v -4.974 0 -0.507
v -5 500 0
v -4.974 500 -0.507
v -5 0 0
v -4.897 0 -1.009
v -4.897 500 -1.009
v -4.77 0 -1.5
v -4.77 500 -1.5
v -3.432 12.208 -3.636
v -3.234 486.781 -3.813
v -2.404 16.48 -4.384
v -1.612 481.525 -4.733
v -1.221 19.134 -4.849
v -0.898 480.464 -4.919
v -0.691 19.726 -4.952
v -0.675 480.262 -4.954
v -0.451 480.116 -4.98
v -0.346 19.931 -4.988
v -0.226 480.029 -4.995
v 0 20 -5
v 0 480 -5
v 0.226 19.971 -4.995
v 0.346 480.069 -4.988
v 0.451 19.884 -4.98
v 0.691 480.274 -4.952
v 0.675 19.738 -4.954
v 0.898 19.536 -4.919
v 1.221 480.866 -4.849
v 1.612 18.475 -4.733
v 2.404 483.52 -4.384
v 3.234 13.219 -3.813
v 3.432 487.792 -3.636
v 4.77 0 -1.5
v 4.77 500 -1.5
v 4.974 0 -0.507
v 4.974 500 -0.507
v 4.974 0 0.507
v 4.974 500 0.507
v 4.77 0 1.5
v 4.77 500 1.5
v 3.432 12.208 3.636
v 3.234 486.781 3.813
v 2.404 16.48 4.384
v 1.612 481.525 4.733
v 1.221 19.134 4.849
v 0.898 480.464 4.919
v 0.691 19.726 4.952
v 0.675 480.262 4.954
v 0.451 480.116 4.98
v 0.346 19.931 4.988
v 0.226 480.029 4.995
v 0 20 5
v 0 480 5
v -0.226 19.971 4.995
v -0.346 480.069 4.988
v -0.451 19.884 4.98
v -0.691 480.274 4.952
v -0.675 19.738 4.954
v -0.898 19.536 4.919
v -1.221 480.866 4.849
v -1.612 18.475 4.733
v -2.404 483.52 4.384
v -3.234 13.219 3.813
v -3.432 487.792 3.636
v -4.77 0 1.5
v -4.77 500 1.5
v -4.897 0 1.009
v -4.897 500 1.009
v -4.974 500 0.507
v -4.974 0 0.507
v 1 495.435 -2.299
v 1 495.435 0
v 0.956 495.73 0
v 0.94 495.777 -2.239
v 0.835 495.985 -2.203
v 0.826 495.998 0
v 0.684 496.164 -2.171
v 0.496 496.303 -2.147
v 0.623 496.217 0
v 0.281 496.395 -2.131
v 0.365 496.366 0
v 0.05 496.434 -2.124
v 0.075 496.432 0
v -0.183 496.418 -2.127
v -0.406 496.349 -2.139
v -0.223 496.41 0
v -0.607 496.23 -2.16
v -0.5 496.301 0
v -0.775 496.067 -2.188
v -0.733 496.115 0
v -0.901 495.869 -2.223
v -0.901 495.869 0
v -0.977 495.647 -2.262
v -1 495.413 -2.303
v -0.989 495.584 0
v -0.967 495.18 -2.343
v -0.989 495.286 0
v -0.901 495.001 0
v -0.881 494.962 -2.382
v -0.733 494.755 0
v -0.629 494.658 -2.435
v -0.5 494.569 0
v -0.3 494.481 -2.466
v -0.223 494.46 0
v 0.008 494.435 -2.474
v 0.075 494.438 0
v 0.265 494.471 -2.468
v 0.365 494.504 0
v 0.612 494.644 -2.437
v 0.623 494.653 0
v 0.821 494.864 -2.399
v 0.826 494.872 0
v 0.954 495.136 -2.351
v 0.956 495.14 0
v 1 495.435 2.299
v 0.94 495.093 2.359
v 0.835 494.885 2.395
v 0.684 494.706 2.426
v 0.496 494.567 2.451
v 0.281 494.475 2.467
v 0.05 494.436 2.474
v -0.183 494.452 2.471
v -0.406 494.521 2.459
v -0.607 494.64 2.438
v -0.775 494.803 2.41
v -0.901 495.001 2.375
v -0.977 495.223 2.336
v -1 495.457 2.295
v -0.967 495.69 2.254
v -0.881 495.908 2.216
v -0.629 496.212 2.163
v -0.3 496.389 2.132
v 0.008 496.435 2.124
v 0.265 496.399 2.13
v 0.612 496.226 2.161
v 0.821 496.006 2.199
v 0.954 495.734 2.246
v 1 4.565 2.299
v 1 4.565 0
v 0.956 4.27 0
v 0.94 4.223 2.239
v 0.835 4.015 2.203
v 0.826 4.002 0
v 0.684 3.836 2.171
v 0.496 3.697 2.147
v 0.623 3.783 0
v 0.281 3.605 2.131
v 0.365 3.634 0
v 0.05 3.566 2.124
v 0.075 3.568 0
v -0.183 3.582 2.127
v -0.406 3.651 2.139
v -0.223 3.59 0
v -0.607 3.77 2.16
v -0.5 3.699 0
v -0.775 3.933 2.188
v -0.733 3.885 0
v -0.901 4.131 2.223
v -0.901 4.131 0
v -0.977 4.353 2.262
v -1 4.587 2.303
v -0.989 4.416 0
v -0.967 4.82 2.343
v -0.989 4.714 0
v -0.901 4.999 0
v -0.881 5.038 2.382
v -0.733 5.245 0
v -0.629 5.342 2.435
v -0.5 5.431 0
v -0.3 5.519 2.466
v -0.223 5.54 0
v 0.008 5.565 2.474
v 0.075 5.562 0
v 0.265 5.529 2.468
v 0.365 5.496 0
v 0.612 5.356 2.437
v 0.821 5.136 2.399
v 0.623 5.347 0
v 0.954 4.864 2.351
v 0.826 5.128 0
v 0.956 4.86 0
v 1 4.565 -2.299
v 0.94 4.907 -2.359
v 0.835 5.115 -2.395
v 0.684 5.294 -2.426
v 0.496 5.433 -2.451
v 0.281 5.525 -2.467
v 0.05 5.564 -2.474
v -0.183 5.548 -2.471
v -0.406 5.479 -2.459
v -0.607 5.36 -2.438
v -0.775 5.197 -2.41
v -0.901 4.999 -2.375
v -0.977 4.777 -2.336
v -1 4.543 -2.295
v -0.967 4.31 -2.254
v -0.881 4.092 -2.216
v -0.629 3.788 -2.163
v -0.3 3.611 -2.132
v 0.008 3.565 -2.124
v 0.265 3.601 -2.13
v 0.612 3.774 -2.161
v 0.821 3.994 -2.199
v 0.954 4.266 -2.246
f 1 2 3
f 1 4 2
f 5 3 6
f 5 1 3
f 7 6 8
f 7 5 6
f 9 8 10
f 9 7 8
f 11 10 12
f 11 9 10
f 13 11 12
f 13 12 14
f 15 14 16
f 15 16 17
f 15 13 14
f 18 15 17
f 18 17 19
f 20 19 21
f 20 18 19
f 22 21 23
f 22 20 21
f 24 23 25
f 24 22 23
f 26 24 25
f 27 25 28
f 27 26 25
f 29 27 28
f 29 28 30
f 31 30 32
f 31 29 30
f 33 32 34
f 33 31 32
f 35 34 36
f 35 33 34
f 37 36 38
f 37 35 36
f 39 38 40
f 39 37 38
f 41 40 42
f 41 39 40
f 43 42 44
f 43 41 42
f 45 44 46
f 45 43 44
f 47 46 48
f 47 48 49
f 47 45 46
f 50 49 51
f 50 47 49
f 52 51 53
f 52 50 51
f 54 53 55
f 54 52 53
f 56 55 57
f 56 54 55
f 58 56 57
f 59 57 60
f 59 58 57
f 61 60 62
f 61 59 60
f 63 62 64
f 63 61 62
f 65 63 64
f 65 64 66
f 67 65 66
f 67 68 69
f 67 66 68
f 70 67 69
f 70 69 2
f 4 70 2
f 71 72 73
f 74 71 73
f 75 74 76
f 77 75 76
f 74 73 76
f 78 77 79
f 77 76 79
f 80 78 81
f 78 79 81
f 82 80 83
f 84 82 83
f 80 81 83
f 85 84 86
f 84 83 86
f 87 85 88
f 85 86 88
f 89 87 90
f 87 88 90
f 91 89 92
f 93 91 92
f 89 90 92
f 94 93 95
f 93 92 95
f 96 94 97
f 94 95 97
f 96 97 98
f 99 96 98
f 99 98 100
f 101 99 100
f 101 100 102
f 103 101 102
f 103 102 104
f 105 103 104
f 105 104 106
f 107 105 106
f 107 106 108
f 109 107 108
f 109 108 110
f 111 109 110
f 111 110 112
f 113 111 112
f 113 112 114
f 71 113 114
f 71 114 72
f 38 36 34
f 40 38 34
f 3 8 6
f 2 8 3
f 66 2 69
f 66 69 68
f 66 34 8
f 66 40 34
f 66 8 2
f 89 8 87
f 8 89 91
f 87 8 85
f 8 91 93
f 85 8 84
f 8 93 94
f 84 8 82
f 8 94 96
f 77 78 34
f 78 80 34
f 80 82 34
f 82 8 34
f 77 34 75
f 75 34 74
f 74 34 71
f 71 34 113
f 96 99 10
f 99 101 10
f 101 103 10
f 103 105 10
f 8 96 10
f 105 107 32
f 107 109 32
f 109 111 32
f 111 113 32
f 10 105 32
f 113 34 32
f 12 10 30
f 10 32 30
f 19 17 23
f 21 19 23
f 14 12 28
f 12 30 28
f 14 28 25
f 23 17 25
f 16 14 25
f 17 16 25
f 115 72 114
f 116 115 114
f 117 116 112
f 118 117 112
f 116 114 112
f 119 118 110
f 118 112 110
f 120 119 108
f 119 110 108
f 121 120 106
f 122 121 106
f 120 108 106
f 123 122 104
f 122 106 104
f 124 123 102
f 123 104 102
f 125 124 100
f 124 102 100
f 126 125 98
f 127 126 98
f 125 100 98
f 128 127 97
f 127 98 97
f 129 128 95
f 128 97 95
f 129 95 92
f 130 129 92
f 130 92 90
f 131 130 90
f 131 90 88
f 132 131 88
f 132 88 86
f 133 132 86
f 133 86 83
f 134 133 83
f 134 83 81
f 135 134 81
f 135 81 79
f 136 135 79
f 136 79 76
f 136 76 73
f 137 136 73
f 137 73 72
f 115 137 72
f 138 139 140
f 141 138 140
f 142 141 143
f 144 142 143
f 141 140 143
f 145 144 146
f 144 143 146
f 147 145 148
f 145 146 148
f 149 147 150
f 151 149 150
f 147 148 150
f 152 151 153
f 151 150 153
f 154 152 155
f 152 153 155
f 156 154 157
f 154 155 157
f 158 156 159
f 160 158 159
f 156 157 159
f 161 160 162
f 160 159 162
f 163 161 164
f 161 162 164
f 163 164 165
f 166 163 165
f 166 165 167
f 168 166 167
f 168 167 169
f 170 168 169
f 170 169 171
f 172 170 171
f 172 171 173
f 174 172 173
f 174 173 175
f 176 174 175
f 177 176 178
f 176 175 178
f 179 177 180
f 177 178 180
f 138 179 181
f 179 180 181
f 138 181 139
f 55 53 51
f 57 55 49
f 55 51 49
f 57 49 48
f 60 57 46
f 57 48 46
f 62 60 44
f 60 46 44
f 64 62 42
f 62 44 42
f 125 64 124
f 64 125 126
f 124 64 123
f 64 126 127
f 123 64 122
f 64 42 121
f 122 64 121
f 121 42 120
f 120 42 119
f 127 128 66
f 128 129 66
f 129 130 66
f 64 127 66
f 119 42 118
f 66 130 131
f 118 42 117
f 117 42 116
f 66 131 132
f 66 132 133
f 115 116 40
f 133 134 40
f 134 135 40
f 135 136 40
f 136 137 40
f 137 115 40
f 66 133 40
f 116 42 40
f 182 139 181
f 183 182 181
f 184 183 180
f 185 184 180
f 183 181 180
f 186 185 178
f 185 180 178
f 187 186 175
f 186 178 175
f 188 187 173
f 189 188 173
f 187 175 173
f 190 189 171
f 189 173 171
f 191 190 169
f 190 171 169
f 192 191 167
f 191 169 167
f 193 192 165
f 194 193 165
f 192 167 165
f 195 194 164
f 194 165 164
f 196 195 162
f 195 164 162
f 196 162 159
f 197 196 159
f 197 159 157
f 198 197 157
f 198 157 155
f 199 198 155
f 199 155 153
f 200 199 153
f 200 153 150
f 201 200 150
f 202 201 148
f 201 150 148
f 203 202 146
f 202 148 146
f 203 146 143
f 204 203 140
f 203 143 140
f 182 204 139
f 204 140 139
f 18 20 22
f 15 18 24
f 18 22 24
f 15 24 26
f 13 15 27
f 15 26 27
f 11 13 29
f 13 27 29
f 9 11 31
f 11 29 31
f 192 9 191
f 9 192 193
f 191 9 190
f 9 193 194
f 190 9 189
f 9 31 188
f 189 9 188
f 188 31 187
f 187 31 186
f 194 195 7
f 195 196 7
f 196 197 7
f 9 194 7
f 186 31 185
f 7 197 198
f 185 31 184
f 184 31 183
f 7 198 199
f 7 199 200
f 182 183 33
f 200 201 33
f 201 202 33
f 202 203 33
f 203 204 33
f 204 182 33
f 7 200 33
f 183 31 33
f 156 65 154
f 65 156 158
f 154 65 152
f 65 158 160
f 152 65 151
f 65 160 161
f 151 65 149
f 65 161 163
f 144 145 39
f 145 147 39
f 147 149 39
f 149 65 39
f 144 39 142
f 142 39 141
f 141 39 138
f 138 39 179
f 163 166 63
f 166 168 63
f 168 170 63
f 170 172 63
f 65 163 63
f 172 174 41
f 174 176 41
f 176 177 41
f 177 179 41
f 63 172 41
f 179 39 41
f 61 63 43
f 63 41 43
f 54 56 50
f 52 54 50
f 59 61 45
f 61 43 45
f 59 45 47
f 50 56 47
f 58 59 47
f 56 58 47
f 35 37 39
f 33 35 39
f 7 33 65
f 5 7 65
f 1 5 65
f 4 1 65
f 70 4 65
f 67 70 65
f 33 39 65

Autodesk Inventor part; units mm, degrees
ref_plane "XZ Plane" through (0, 0, 0) normal (0, 1, 0) x (-1, 0, 0)
sketch "Sketch1" plane through (0, 0, 0) normal (0, 1, 0) x (-1, 0, 0)
  circle A0 centre (0, 0) radius 5
  dimension "d0" = 10
extrude "Extrusion1" add sketch "Sketch1" along normal blind 500
ref_plane "Work Plane1" through (5, 0, 0) normal (1, 0, 0) x (0, 1, 0)
sketch "Sketch2" plane through (5, 0, 0) normal (1, 0, 0) x (0, 1, 0)
  line L0 (500, -5) -> (500, 5) projected
  line L1 (0, 5) -> (0, -5) projected
  line L2 (0, 5) -> (500, 5) projected
  line L3 (0, -5) -> (500, -5) projected
  line L4 (0, 0) -> (0, 1.5)
  line L5 (0, 5) -> (0, -5) projected
  line L6 (0, 0) -> (0, -1.5)
  line L7 (-100, 0) -> (600, 0) projected
  line L8 (0, 1.5) -> (20, 5)
  line L9 (20, 5) -> (20, -5)
  line L10 (20, -5) -> (0, -1.5)
  dimension "d4" = 1.5
  dimension "d5" = 1.5
  dimension "d6" = 20
extrude "Extrusion2" cut sketch "Sketch2" against normal blind 500 contours L3 L1 L10 | L8 L1 L2
sketch "Sketch3" plane through (0, 0, 0) normal (0, 0, 1) x (1, 0, 0)
  point P0 (0, 0)
sketch "Sketch4" plane through (0, 0, 0) normal (0, 0, 1) x (1, 0, 0)
  circle A0 centre (0, 4.565) radius 1
  point P0 (0, 0)
  dimension "d9" = 2
extrude "Extrusion3" cut sketch "Sketch4" along normal mid plane 500
ref_plane "Work Plane2" through (0, 250, 0) normal (0, -1, 0) x (1, 0, 0)
mirror "Mirror1" about plane through (0, 250, 0) normal (0, -1, 0) of "Extrusion2", "Extrusion3"
properties part number "Straight connector"
